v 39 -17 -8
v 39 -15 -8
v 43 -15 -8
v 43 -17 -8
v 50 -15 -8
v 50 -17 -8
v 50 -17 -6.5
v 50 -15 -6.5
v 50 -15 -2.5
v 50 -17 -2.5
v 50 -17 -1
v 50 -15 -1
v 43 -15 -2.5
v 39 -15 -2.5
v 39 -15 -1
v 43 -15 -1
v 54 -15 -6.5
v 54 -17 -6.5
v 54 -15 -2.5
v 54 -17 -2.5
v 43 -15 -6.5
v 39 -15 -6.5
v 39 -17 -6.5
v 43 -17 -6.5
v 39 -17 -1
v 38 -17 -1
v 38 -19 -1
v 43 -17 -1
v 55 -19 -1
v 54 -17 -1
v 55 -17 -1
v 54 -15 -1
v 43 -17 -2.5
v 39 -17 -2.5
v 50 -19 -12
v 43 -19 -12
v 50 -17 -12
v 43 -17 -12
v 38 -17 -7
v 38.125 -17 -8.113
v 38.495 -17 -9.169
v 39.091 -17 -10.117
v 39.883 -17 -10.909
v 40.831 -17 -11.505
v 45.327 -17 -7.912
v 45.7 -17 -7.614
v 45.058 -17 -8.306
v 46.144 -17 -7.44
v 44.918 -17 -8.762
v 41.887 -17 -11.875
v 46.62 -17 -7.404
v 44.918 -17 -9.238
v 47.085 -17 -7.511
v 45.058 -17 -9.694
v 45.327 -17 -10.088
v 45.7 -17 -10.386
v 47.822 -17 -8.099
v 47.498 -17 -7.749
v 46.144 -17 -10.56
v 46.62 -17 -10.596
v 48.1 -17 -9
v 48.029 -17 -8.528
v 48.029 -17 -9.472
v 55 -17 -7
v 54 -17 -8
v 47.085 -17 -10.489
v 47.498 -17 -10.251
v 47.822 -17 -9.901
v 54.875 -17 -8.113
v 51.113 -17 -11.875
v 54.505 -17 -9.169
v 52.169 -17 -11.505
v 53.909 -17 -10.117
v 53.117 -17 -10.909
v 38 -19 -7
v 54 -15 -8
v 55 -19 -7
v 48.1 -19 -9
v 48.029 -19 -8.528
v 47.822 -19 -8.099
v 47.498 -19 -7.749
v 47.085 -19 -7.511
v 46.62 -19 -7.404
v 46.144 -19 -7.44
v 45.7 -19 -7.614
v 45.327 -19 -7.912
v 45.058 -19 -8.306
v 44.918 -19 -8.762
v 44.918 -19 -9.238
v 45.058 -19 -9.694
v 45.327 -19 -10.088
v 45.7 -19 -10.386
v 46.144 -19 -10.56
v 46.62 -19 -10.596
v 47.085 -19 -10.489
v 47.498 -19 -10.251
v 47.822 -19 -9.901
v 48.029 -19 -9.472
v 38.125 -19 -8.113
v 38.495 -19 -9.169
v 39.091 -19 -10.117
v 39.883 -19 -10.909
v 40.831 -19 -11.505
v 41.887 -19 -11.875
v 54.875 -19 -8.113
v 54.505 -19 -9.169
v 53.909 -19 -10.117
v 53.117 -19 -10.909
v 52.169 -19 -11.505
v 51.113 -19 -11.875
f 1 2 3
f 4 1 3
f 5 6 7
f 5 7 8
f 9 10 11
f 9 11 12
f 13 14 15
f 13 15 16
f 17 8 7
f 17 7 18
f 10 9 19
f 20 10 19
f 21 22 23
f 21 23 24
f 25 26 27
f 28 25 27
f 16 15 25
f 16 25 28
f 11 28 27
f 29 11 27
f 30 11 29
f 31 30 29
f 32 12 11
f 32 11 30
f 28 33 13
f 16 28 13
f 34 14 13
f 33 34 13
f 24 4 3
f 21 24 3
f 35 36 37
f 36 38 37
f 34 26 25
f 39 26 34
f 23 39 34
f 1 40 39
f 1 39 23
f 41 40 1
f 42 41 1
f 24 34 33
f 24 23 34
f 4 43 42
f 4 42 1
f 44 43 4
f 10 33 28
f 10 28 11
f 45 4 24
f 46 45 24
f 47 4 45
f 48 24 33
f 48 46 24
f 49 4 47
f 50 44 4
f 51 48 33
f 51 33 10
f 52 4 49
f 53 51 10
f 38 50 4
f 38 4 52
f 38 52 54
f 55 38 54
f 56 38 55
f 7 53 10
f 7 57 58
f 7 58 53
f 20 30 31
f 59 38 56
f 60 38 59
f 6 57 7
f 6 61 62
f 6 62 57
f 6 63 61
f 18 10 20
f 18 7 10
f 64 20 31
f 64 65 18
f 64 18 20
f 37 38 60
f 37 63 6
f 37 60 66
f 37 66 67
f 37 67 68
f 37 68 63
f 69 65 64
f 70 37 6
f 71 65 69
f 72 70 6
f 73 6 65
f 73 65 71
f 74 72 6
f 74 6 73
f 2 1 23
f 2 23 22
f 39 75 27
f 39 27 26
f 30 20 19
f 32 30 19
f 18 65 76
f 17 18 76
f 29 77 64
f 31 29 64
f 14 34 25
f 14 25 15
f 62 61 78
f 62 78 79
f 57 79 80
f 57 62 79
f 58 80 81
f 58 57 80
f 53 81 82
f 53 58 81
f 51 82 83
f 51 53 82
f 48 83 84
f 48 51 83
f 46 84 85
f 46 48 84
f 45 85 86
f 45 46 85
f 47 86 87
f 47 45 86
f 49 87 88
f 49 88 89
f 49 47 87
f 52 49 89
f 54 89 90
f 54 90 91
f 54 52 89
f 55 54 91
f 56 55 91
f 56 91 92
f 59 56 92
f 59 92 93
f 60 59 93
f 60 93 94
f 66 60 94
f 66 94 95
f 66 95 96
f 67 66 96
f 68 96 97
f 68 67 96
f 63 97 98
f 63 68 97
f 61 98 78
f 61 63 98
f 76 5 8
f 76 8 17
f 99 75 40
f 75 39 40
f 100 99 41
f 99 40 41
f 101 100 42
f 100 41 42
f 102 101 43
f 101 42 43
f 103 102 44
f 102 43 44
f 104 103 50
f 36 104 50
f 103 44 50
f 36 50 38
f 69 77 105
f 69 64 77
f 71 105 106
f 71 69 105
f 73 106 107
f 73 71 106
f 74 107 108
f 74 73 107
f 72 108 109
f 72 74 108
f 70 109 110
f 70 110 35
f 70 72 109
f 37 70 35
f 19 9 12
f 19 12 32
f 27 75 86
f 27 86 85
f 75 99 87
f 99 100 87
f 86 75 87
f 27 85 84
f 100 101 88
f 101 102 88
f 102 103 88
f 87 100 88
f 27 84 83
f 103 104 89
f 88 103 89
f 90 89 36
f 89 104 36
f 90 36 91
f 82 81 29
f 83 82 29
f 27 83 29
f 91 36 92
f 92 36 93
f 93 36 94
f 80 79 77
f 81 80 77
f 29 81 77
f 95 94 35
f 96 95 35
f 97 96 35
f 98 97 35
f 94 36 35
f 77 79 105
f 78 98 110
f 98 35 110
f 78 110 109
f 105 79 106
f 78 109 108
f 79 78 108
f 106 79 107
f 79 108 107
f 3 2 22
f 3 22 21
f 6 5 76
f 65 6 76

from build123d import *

# Parameters (mm, degrees)
CYLINDER067_R     = 1.6
CYLINDER067_DEPTH = 2
BOX164_W          = 17
BOX164_H          = 2
BOX164_DEPTH      = 11
FILLET036_R       = 5
BOX165_W          = 4
BOX165_H          = 2
BOX165_DEPTH      = 1.5
BOX167_W          = 4
BOX167_H          = 2
BOX167_DEPTH      = 1.5
BOX166_W          = 4
BOX166_H          = 2
BOX166_DEPTH      = 1.5
BOX168_W          = 4
BOX168_H          = 2
BOX168_DEPTH      = 1.5


with BuildPart() as cylinder148:
    # Cylinder067 → Cylinder067 (new body)
    with BuildSketch(Plane(origin=(46.5, -17, -9), x_dir=(1, 0, 0), z_dir=(0, -1, 0))):
        Circle(CYLINDER067_R)
    extrude(amount=CYLINDER067_DEPTH)


with BuildPart() as cut092:
    # Box164 → Box164 (new body)
    with BuildSketch(Plane(origin=(38, -19, -12), x_dir=(1, 0, 0), z_dir=(0, 0, 1))):
        with Locations((8.5, 1)):
            Rectangle(BOX164_W, BOX164_H)
    extrude(amount=BOX164_DEPTH)

    # Fillet036
    fillet036_edges = [cut092.edges().sort_by_distance(p)[0] for p in [
        (38, -18, -12),
        (55, -18, -12),
    ]]
    fillet(fillet036_edges, radius=FILLET036_R)

    # Cut092: cut Cylinder148
    add(cylinder148.part, mode=Mode.SUBTRACT)


with BuildPart() as cube154:
    # Box165 → Box165 (new body)
    with BuildSketch(Plane(origin=(39, -17, -2.5), x_dir=(1, 0, 0), z_dir=(0, 0, 1))):
        with Locations((2, 1)):
            Rectangle(BOX165_W, BOX165_H)
    extrude(amount=BOX165_DEPTH)


with BuildPart() as cube156:
    # Box167 → Box167 (new body)
    with BuildSketch(Plane(origin=(50, -17, -8), x_dir=(1, 0, 0), z_dir=(0, 0, 1))):
        with Locations((2, 1)):
            Rectangle(BOX167_W, BOX167_H)
    extrude(amount=BOX167_DEPTH)


with BuildPart() as cube155:
    # Box166 → Box166 (new body)
    with BuildSketch(Plane(origin=(39, -17, -8), x_dir=(1, 0, 0), z_dir=(0, 0, 1))):
        with Locations((2, 1)):
            Rectangle(BOX166_W, BOX166_H)
    extrude(amount=BOX166_DEPTH)


with BuildPart() as fusion052:
    # Box168 → Box168 (new body)
    with BuildSketch(Plane(origin=(50, -17, -2.5), x_dir=(1, 0, 0), z_dir=(0, 0, 1))):
        with Locations((2, 1)):
            Rectangle(BOX168_W, BOX168_H)
    extrude(amount=BOX168_DEPTH)

    # Fusion052: union Cut092, Cube154, Cube156, Cube155
    add(cut092.part)
    add(cube154.part)
    add(cube156.part)
    add(cube155.part)


solid = fusion052.part
